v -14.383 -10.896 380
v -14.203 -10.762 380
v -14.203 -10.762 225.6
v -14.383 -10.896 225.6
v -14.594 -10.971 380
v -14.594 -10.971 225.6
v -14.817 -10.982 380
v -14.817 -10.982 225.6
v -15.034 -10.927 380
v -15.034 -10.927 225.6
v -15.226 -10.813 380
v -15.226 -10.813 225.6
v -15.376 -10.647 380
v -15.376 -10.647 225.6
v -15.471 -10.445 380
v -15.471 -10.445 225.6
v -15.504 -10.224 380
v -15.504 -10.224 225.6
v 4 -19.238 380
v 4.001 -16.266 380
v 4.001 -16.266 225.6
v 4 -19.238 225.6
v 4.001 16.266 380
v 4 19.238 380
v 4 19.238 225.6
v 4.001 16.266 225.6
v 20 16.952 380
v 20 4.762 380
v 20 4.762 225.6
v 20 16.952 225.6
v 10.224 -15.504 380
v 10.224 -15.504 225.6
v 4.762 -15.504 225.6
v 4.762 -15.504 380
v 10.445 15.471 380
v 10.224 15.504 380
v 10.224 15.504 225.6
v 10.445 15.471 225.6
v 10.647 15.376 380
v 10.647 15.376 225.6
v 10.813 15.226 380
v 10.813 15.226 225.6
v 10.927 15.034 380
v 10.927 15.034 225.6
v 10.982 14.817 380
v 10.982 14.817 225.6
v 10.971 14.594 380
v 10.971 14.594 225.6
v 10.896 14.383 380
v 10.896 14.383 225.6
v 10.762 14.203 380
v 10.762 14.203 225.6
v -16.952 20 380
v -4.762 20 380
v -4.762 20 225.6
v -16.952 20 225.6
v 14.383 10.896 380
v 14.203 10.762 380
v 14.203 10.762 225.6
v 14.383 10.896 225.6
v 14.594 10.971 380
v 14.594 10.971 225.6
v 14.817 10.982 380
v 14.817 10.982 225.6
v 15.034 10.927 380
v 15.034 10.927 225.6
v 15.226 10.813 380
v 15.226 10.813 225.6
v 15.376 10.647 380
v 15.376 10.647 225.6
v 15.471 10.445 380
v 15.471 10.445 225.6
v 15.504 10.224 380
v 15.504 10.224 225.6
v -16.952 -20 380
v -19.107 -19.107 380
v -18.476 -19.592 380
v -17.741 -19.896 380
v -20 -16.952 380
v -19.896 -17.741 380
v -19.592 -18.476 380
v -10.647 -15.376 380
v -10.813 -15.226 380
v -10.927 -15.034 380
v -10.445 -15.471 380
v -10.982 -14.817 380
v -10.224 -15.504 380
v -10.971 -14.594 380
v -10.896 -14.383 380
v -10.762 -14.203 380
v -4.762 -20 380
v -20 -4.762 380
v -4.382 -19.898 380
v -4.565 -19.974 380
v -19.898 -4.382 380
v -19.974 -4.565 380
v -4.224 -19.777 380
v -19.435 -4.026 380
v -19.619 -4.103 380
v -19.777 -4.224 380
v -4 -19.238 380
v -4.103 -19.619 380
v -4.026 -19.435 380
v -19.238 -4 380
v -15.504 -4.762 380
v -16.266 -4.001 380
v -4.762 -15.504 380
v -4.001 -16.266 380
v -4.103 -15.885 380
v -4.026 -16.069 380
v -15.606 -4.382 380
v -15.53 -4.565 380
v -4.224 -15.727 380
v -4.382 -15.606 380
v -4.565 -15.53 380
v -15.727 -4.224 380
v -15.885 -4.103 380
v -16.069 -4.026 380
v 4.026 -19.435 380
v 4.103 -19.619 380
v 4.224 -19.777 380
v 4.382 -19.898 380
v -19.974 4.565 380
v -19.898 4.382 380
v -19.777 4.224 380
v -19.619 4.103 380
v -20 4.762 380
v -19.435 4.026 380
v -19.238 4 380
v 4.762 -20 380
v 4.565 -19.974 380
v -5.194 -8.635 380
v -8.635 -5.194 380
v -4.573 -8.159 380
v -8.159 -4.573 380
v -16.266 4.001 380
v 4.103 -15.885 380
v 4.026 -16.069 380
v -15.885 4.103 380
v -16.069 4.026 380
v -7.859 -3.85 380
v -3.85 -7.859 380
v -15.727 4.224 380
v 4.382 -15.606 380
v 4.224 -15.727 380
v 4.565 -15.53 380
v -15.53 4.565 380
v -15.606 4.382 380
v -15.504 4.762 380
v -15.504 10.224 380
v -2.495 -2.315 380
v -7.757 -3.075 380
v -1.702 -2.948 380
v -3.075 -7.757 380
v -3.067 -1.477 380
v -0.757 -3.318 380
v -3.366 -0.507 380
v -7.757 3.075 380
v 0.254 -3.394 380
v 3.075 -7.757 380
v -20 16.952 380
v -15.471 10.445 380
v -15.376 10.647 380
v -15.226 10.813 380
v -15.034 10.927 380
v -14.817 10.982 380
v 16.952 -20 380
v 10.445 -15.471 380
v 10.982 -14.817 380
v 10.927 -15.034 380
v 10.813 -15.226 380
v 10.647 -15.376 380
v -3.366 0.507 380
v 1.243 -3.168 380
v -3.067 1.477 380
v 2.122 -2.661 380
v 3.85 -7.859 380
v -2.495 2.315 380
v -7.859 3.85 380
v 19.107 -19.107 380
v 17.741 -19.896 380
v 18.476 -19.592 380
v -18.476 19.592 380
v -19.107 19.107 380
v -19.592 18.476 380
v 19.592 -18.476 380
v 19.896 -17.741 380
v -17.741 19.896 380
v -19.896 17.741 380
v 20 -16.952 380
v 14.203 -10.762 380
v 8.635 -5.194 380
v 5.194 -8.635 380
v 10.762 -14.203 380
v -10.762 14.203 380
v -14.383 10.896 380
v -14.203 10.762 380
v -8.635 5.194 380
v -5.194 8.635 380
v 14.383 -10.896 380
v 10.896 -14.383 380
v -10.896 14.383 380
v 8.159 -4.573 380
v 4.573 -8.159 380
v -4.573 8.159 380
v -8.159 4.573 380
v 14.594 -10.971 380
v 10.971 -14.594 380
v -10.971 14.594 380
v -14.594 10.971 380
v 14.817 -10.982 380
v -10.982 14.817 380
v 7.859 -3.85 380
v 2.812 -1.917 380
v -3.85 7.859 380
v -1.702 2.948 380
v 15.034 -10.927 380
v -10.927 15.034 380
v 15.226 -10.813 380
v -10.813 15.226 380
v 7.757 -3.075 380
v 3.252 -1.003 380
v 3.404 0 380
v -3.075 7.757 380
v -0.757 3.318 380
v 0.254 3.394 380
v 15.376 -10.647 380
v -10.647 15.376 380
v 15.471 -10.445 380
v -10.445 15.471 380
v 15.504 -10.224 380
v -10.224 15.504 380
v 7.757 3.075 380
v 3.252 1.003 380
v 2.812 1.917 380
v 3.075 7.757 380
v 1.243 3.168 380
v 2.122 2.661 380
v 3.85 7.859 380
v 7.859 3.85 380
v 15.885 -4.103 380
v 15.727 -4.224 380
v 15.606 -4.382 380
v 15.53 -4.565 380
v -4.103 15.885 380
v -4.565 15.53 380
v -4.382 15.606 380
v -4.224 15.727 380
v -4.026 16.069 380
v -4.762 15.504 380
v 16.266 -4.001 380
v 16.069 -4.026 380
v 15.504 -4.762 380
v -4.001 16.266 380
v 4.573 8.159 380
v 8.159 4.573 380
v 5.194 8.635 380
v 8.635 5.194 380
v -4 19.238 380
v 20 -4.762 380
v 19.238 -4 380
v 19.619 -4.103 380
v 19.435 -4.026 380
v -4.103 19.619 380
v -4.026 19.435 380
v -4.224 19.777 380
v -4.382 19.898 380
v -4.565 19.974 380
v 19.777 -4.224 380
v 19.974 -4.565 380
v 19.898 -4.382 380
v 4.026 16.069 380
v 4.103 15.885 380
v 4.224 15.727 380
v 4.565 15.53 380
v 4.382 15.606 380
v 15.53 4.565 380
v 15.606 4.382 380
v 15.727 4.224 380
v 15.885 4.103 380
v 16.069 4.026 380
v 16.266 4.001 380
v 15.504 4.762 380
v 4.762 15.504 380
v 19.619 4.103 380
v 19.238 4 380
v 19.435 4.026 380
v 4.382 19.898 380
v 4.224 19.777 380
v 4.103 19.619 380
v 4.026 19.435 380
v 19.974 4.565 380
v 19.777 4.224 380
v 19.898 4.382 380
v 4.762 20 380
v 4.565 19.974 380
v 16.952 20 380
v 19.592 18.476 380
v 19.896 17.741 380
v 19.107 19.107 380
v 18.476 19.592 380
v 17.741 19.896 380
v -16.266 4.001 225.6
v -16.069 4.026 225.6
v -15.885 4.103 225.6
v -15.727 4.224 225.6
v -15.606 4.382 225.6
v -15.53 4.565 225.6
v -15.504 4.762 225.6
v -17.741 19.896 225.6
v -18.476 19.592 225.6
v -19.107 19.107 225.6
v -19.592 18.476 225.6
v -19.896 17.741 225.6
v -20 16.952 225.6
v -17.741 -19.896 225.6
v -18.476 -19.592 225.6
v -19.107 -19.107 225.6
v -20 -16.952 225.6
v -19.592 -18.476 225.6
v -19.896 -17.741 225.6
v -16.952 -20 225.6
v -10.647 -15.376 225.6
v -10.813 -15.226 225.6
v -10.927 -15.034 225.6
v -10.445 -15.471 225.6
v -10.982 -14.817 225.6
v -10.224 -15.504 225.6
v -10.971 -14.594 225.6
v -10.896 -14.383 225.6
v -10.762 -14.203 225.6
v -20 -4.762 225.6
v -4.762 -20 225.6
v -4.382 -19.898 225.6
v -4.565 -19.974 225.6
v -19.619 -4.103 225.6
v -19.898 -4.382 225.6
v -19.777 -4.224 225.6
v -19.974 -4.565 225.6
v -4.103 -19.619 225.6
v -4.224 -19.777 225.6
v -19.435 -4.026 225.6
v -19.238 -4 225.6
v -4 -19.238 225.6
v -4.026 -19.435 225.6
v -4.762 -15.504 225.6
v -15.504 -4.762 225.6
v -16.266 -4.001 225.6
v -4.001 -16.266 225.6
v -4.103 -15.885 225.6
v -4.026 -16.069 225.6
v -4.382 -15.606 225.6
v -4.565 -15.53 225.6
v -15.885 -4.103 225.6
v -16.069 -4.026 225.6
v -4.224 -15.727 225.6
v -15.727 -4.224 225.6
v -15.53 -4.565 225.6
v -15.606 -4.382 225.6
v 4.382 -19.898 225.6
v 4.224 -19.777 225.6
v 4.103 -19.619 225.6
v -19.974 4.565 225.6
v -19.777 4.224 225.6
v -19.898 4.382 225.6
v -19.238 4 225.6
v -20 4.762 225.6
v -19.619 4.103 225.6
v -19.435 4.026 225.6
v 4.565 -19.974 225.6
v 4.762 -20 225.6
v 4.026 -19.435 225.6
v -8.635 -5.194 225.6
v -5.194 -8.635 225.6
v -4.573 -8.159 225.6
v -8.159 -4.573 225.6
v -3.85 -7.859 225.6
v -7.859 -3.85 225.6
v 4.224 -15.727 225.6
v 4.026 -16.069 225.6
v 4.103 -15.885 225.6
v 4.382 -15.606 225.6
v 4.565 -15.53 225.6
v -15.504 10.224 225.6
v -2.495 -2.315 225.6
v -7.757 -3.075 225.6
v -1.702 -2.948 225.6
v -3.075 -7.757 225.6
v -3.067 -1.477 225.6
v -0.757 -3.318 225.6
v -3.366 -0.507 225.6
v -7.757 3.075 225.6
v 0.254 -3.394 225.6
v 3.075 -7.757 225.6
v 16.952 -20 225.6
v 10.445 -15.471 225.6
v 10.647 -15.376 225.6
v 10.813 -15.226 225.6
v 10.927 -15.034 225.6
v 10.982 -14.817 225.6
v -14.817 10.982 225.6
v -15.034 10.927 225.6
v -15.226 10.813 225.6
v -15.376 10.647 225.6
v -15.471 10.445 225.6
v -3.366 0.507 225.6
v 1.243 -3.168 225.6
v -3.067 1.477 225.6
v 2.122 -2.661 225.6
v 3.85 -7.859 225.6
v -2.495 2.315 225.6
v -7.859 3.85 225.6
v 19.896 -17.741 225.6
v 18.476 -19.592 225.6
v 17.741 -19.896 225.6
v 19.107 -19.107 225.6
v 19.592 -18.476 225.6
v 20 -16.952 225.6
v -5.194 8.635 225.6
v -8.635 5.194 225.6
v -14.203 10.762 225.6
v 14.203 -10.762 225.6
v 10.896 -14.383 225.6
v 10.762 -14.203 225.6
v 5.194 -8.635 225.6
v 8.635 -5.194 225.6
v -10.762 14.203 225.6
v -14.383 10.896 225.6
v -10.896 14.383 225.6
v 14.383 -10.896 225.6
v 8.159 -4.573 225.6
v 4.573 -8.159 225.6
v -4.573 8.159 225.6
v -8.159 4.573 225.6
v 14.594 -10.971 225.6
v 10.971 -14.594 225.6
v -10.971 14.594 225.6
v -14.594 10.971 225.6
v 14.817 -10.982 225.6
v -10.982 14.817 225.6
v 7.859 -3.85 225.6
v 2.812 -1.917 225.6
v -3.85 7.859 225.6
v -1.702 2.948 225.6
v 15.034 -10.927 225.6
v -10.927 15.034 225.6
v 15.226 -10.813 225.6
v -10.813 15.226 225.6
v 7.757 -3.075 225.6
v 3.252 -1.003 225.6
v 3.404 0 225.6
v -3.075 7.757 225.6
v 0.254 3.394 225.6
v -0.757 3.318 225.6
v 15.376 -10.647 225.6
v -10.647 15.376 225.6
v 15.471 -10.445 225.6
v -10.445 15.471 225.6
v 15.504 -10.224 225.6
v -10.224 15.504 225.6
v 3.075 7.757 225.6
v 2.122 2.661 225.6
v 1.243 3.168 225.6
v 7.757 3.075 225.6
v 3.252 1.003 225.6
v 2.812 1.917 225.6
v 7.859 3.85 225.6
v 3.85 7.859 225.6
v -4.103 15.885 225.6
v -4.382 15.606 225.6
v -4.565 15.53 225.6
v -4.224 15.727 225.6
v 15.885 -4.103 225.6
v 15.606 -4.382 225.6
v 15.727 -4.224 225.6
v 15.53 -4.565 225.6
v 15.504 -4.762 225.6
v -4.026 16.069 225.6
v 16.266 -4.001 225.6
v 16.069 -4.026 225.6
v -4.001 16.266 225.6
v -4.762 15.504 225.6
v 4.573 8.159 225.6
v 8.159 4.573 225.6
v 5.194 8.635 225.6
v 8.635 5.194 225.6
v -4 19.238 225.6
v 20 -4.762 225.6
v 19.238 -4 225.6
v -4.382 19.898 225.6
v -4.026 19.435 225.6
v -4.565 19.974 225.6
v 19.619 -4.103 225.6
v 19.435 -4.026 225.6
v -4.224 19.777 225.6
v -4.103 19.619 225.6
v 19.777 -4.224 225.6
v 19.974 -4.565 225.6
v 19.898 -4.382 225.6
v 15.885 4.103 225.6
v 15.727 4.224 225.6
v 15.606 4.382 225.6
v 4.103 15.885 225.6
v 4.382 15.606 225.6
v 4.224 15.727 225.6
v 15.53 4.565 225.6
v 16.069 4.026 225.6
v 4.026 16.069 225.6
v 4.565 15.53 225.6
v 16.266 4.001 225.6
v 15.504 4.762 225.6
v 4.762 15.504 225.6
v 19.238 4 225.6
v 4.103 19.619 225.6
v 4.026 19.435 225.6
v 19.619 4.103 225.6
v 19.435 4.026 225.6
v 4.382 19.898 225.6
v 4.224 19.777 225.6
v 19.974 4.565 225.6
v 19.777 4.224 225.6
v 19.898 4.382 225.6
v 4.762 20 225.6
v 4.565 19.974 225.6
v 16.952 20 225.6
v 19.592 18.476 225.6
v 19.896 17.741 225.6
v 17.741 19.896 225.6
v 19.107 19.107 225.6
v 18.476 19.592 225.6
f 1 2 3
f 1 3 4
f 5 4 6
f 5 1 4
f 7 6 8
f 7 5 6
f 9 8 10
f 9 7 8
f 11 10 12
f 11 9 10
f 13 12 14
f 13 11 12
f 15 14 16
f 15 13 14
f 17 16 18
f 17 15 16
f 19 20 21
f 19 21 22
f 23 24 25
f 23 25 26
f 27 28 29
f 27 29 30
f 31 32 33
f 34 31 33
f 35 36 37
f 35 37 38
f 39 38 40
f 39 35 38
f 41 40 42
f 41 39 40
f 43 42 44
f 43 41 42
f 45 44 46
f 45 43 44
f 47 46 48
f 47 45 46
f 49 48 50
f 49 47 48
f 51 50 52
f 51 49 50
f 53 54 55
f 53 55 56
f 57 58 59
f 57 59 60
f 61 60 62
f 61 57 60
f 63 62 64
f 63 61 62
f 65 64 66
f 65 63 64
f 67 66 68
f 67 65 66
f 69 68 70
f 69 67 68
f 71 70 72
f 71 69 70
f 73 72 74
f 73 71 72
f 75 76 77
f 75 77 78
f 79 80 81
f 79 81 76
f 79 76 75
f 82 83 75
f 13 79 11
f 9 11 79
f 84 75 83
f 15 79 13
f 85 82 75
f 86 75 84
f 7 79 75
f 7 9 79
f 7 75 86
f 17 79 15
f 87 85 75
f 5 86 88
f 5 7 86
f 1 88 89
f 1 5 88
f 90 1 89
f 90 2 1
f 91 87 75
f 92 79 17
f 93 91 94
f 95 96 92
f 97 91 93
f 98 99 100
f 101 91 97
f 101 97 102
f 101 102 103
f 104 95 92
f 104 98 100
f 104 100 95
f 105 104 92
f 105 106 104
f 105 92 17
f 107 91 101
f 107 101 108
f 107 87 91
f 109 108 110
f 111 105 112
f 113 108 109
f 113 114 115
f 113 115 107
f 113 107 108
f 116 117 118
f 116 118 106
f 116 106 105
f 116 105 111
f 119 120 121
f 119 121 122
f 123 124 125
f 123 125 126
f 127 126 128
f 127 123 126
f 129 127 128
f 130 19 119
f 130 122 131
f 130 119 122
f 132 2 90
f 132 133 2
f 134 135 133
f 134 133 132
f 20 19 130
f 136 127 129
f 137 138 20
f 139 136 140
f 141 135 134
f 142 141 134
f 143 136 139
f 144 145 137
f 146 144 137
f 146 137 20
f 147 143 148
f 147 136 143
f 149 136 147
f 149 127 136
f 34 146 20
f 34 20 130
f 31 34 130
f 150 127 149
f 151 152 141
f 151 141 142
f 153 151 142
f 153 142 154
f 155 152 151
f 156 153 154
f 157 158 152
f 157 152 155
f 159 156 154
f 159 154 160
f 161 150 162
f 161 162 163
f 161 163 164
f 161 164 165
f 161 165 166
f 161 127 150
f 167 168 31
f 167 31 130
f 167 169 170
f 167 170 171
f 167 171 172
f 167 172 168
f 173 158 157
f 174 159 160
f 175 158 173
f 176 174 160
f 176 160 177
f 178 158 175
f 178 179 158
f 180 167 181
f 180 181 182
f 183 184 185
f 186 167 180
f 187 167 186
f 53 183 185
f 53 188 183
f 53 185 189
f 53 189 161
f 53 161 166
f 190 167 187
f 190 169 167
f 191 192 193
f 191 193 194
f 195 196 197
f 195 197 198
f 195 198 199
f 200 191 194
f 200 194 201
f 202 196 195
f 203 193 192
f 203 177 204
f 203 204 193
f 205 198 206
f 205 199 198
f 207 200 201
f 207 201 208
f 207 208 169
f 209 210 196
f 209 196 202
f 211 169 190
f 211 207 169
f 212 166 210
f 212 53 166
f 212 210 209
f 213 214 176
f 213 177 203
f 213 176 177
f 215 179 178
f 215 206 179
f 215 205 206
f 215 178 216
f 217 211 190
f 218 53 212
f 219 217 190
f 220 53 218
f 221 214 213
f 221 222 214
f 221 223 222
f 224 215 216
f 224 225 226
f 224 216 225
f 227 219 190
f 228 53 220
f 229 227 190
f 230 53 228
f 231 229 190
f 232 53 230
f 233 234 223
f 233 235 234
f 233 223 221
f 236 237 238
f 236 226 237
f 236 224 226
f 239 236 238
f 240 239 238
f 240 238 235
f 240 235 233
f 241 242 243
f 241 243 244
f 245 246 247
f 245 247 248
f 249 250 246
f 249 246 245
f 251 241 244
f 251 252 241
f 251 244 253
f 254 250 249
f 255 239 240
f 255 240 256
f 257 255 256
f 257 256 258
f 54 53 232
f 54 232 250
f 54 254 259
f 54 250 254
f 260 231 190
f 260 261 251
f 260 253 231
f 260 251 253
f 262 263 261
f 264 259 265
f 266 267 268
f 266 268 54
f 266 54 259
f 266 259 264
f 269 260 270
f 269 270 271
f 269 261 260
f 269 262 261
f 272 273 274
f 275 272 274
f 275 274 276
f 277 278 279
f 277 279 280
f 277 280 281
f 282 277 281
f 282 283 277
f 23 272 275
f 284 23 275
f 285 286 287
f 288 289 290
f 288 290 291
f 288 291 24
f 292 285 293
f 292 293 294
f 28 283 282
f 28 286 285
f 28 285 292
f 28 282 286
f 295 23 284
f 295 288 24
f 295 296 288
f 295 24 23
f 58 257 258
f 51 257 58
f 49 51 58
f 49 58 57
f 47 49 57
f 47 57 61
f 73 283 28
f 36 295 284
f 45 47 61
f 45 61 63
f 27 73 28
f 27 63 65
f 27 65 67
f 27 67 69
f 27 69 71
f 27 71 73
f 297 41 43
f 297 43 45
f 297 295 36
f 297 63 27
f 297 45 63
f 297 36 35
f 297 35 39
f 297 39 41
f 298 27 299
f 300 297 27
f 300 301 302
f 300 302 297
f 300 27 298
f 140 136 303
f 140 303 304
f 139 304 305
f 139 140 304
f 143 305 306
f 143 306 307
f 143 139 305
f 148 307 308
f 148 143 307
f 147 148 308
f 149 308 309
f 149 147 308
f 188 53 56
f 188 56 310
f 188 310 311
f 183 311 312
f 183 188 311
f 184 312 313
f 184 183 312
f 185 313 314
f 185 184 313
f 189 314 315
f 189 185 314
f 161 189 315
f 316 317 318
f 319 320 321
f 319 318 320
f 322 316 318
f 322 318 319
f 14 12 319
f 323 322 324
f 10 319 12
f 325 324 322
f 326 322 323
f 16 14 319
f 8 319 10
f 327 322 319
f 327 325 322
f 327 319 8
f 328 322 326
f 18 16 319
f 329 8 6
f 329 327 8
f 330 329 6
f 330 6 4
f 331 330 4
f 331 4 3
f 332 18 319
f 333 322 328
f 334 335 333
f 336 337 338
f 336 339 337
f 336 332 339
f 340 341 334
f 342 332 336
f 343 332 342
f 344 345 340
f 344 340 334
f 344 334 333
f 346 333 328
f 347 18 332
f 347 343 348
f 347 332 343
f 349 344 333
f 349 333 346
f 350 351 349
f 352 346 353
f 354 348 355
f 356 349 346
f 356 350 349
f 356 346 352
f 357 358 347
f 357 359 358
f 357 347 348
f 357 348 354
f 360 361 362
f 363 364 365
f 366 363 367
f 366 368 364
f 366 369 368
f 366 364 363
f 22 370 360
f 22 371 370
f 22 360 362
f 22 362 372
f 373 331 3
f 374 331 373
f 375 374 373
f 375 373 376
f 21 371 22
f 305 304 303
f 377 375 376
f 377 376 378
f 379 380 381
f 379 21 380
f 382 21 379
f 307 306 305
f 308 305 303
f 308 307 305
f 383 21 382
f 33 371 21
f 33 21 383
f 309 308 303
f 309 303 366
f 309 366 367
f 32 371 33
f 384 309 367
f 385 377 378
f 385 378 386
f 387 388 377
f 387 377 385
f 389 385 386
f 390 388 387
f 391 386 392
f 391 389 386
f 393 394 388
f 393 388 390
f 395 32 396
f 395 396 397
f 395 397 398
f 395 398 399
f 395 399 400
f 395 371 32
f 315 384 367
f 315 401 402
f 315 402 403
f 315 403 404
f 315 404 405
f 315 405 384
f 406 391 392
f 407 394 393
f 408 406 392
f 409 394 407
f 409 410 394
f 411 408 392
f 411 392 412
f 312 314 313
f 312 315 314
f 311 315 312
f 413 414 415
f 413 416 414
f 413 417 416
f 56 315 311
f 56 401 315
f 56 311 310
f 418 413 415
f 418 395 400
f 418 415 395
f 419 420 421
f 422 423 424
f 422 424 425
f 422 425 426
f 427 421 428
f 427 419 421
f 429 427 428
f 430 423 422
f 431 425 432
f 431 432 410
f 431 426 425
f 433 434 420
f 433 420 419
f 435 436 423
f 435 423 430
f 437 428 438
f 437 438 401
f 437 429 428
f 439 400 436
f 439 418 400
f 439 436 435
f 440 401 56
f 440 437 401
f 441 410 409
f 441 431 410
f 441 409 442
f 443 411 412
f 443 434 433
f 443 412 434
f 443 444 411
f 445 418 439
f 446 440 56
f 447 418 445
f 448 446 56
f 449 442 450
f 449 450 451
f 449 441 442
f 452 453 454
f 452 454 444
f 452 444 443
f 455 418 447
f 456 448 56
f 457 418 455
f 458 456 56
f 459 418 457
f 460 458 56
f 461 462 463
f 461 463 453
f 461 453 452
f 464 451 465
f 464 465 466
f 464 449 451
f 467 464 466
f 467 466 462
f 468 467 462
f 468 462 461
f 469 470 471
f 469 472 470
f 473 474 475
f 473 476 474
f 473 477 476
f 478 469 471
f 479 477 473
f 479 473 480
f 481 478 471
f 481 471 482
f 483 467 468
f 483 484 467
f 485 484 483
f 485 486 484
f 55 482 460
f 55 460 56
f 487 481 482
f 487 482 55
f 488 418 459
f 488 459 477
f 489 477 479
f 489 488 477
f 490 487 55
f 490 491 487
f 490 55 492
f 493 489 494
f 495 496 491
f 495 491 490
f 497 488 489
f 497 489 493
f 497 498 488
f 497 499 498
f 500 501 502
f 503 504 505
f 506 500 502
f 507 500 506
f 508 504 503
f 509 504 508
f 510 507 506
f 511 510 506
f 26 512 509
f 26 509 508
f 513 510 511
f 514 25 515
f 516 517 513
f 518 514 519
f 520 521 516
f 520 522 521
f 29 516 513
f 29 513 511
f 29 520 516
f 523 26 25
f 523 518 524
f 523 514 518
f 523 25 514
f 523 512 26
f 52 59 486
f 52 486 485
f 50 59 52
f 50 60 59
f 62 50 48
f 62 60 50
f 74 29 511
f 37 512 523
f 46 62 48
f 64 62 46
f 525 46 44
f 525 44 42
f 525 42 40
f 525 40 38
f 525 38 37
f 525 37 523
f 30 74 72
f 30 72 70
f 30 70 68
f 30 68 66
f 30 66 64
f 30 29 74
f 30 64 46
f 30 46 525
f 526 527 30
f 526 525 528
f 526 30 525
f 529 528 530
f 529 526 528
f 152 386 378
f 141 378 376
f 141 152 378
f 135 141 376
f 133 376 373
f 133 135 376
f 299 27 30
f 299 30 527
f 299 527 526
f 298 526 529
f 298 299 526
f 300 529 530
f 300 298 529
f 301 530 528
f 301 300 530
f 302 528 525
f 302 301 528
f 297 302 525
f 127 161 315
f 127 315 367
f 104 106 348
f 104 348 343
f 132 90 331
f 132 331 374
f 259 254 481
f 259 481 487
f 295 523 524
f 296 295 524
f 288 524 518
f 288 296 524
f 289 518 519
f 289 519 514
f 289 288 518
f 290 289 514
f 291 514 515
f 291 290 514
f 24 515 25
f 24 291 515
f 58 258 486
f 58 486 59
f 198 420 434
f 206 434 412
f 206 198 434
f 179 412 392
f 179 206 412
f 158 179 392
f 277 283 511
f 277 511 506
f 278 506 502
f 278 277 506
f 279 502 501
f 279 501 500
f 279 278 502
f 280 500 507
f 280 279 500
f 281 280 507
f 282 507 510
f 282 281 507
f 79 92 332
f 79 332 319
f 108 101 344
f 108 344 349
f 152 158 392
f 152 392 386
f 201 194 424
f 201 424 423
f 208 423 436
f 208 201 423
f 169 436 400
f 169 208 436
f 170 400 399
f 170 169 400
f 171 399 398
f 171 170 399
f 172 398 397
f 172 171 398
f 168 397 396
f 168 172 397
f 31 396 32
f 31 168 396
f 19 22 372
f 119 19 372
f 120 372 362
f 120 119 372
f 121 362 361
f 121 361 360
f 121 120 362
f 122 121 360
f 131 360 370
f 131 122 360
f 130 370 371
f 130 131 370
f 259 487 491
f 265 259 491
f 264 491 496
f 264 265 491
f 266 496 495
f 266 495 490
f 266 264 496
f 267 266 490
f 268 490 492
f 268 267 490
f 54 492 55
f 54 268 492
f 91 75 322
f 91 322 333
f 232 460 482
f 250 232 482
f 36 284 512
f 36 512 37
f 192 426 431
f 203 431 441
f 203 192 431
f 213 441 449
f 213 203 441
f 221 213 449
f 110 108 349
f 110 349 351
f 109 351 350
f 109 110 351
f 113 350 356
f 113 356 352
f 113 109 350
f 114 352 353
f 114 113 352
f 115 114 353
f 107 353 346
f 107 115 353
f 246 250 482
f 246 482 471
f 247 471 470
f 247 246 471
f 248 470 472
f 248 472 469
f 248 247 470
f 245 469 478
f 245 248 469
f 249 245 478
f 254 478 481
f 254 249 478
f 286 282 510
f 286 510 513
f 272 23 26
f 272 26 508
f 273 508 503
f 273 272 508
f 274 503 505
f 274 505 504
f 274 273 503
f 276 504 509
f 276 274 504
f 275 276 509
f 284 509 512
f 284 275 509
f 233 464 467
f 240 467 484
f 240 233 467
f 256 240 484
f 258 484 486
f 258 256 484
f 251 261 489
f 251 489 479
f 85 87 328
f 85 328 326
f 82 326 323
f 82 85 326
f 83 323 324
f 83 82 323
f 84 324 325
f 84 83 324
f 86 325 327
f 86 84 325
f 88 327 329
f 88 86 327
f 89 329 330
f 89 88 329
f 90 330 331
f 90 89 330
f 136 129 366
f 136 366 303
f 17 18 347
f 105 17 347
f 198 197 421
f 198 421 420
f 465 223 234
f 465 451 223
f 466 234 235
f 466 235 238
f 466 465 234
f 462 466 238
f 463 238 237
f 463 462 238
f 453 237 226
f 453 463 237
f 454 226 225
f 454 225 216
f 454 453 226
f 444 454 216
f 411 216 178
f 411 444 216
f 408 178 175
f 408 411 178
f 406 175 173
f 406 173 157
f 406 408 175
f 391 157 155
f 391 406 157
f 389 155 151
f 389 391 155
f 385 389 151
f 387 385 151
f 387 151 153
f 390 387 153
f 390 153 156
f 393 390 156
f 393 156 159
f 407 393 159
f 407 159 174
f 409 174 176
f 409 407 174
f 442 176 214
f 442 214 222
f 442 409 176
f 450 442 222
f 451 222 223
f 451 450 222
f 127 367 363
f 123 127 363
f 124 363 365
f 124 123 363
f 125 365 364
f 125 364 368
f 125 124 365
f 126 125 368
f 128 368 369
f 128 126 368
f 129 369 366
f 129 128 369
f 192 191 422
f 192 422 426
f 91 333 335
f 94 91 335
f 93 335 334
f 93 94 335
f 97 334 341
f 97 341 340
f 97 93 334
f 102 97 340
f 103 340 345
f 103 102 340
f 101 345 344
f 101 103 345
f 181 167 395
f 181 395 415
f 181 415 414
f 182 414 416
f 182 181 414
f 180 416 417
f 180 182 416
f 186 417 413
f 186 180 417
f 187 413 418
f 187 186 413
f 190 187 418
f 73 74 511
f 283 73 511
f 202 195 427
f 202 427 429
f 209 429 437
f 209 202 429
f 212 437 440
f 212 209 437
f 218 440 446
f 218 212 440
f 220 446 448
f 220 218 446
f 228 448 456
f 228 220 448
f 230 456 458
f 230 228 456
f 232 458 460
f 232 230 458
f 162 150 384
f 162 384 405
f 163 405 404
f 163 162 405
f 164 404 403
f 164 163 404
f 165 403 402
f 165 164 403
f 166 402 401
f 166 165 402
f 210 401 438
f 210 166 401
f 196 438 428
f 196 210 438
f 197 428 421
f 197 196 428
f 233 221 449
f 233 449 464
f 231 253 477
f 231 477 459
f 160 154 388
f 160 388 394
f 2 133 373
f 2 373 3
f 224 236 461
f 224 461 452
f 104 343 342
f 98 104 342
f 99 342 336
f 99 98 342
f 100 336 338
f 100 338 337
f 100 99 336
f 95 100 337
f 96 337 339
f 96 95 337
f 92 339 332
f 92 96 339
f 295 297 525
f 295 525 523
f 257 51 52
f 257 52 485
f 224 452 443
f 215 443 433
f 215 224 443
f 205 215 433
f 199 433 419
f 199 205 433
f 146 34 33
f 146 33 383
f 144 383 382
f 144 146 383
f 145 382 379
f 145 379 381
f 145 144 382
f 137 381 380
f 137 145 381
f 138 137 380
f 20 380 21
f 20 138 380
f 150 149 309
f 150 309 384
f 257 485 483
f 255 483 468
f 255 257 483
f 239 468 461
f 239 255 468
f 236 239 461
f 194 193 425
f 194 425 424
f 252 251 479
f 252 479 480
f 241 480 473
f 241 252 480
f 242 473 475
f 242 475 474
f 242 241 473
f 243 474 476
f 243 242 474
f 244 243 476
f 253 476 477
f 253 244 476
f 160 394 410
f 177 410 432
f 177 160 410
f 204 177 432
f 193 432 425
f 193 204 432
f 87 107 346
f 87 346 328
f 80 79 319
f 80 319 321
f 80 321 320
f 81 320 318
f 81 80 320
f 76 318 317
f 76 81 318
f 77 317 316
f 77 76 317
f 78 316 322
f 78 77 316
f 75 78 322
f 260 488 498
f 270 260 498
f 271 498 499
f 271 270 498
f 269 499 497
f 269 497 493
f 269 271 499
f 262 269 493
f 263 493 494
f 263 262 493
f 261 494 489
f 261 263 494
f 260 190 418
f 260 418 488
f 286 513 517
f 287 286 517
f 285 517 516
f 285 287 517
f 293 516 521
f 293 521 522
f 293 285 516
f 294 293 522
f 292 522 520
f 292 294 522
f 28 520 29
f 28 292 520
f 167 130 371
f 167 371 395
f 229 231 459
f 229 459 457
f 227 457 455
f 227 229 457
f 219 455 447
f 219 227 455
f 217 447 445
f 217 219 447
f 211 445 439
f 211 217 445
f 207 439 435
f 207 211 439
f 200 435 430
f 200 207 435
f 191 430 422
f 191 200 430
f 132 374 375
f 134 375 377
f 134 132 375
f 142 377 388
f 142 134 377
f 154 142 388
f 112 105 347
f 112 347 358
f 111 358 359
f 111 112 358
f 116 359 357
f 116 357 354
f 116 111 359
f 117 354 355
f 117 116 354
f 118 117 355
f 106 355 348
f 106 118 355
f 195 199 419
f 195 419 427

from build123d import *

# Parameters (mm, degrees)
SKETCH1_R               = 3.4036
BOSS_EXTRUDE1_DEPTH     = 380
SKETCH2_W               = 605.6
SKETCH2_H               = 40
CUT_EXTRUDE1_DEPTH      = 65
CUT_EXTRUDE1_DEPTH_BACK = 71


with BuildPart() as part:
    # Sketch1 → Boss-Extrude1 (new body, symmetric)
    with BuildSketch(Plane.XY):
        with BuildLine():
            Line((-20, 16.952), (-20, 4.7625))
            ThreePointArc((-20, 4.7625), (-19.776815367, 4.223684633), (-19.238, 4.0005))
            Line((-19.238, 4.0005), (-16.2662, 4.0005))
            ThreePointArc((-16.2662, 4.0005), (-15.727384633, 4.223684633), (-15.5042, 4.7625))
            Line((-15.5042, 4.7625), (-15.5042, 10.2235))
            ThreePointArc((-15.5042, 10.2235), (-15.033804775, 10.927496204), (-14.203384633, 10.762315367))
            Line((-14.203384633, 10.762315367), (-8.635059555, 5.19399029))
            ThreePointArc((-8.635059555, 5.19399029), (-7.985348265, 4.221628629), (-7.7572, 3.074649845))
            Line((-7.7572, 3.074649845), (-7.7572, -3.074649845))
            ThreePointArc((-7.7572, -3.074649845), (-7.985348265, -4.221628629), (-8.635059555, -5.19399029))
            Line((-8.635059555, -5.19399029), (-14.203384633, -10.762315367))
            ThreePointArc((-14.203384633, -10.762315367), (-15.033804775, -10.927496204), (-15.5042, -10.2235))
            Line((-15.5042, -10.2235), (-15.5042, -4.7625))
            ThreePointArc((-15.5042, -4.7625), (-15.727384633, -4.223684633), (-16.2662, -4.0005))
            Line((-16.2662, -4.0005), (-19.238, -4.0005))
            ThreePointArc((-19.238, -4.0005), (-19.776815367, -4.223684633), (-20, -4.7625))
            Line((-20, -4.7625), (-20, -16.952))
            ThreePointArc((-20, -16.952), (-19.107261469, -19.107261469), (-16.952, -20))
            Line((-16.952, -20), (-4.7625, -20))
            ThreePointArc((-4.7625, -20), (-4.223684633, -19.776815367), (-4.0005, -19.238))
            Line((-4.0005, -19.238), (-4.0005, -16.2662))
            ThreePointArc((-4.0005, -16.2662), (-4.223684633, -15.727384633), (-4.7625, -15.5042))
            Line((-4.7625, -15.5042), (-10.2235, -15.5042))
            ThreePointArc((-10.2235, -15.5042), (-10.927496204, -15.033804775), (-10.762315367, -14.203384633))
            Line((-10.762315367, -14.203384633), (-5.19399029, -8.635059555))
            ThreePointArc((-5.19399029, -8.635059555), (-4.221628629, -7.985348265), (-3.074649845, -7.7572))
            Line((-3.074649845, -7.7572), (3.074649845, -7.7572))
            ThreePointArc((3.074649845, -7.7572), (4.221628629, -7.985348265), (5.19399029, -8.635059555))
            Line((5.19399029, -8.635059555), (10.762315367, -14.203384633))
            ThreePointArc((10.762315367, -14.203384633), (10.927496204, -15.033804775), (10.2235, -15.5042))
            Line((10.2235, -15.5042), (4.7625, -15.5042))
            ThreePointArc((4.7625, -15.5042), (4.223684633, -15.727384633), (4.0005, -16.2662))
            Line((4.0005, -16.2662), (4.0005, -19.238))
            ThreePointArc((4.0005, -19.238), (4.223684633, -19.776815367), (4.7625, -20))
            Line((4.7625, -20), (16.952, -20))
            ThreePointArc((16.952, -20), (19.107261469, -19.107261469), (20, -16.952))
            Line((20, -16.952), (20, -4.7625))
            ThreePointArc((20, -4.7625), (19.776815367, -4.223684633), (19.238, -4.0005))
            Line((19.238, -4.0005), (16.2662, -4.0005))
            ThreePointArc((16.2662, -4.0005), (15.727384633, -4.223684633), (15.5042, -4.7625))
            Line((15.5042, -4.7625), (15.5042, -10.2235))
            ThreePointArc((15.5042, -10.2235), (15.033804775, -10.927496204), (14.203384633, -10.762315367))
            Line((14.203384633, -10.762315367), (8.635059555, -5.19399029))
            ThreePointArc((8.635059555, -5.19399029), (7.985348265, -4.221628629), (7.7572, -3.074649845))
            Line((7.7572, -3.074649845), (7.7572, 3.074649845))
            ThreePointArc((7.7572, 3.074649845), (7.985348265, 4.221628629), (8.635059555, 5.19399029))
            Line((8.635059555, 5.19399029), (14.203384633, 10.762315367))
            ThreePointArc((14.203384633, 10.762315367), (15.033804775, 10.927496204), (15.5042, 10.2235))
            Line((15.5042, 10.2235), (15.5042, 4.7625))
            ThreePointArc((15.5042, 4.7625), (15.727384633, 4.223684633), (16.2662, 4.0005))
            Line((16.2662, 4.0005), (19.238, 4.0005))
            ThreePointArc((19.238, 4.0005), (19.776815367, 4.223684633), (20, 4.7625))
            Line((20, 4.7625), (20, 16.952))
            ThreePointArc((20, 16.952), (19.107261469, 19.107261469), (16.952, 20))
            Line((16.952, 20), (4.7625, 20))
            ThreePointArc((4.7625, 20), (4.223684633, 19.776815367), (4.0005, 19.238))
            Line((4.0005, 19.238), (4.0005, 16.2662))
            ThreePointArc((4.0005, 16.2662), (4.223684633, 15.727384633), (4.7625, 15.5042))
            Line((4.7625, 15.5042), (10.2235, 15.5042))
            ThreePointArc((10.2235, 15.5042), (10.927496204, 15.033804775), (10.762315367, 14.203384633))
            Line((10.762315367, 14.203384633), (5.19399029, 8.635059555))
            ThreePointArc((5.19399029, 8.635059555), (4.221628629, 7.985348265), (3.074649845, 7.7572))
            Line((3.074649845, 7.7572), (-3.074649845, 7.7572))
            ThreePointArc((-3.074649845, 7.7572), (-4.221628629, 7.985348265), (-5.19399029, 8.635059555))
            Line((-5.19399029, 8.635059555), (-10.762315367, 14.203384633))
            ThreePointArc((-10.762315367, 14.203384633), (-10.927496204, 15.033804775), (-10.2235, 15.5042))
            Line((-10.2235, 15.5042), (-4.7625, 15.5042))
            ThreePointArc((-4.7625, 15.5042), (-4.223684633, 15.727384633), (-4.0005, 16.2662))
            Line((-4.0005, 16.2662), (-4.0005, 19.238))
            ThreePointArc((-4.0005, 19.238), (-4.223684633, 19.776815367), (-4.7625, 20))
            Line((-4.7625, 20), (-16.952, 20))
            ThreePointArc((-16.952, 20), (-19.107261469, 19.107261469), (-20, 16.952))
        make_face()
        Circle(SKETCH1_R, mode=Mode.SUBTRACT)
    extrude(amount=BOSS_EXTRUDE1_DEPTH, both=True)

    # Sketch2 → Cut-Extrude1 (cut, two sides)
    with BuildSketch(Plane(origin=(0, 0, 0), x_dir=(0, 0, -1), z_dir=(1, 0, 0))) as cut_extrude1_sk:
        with Locations((77.2, 0)):
            Rectangle(SKETCH2_W, SKETCH2_H)
    extrude(amount=CUT_EXTRUDE1_DEPTH, mode=Mode.SUBTRACT)
    extrude(cut_extrude1_sk.sketch, amount=-CUT_EXTRUDE1_DEPTH_BACK, mode=Mode.SUBTRACT)


solid = part.part
